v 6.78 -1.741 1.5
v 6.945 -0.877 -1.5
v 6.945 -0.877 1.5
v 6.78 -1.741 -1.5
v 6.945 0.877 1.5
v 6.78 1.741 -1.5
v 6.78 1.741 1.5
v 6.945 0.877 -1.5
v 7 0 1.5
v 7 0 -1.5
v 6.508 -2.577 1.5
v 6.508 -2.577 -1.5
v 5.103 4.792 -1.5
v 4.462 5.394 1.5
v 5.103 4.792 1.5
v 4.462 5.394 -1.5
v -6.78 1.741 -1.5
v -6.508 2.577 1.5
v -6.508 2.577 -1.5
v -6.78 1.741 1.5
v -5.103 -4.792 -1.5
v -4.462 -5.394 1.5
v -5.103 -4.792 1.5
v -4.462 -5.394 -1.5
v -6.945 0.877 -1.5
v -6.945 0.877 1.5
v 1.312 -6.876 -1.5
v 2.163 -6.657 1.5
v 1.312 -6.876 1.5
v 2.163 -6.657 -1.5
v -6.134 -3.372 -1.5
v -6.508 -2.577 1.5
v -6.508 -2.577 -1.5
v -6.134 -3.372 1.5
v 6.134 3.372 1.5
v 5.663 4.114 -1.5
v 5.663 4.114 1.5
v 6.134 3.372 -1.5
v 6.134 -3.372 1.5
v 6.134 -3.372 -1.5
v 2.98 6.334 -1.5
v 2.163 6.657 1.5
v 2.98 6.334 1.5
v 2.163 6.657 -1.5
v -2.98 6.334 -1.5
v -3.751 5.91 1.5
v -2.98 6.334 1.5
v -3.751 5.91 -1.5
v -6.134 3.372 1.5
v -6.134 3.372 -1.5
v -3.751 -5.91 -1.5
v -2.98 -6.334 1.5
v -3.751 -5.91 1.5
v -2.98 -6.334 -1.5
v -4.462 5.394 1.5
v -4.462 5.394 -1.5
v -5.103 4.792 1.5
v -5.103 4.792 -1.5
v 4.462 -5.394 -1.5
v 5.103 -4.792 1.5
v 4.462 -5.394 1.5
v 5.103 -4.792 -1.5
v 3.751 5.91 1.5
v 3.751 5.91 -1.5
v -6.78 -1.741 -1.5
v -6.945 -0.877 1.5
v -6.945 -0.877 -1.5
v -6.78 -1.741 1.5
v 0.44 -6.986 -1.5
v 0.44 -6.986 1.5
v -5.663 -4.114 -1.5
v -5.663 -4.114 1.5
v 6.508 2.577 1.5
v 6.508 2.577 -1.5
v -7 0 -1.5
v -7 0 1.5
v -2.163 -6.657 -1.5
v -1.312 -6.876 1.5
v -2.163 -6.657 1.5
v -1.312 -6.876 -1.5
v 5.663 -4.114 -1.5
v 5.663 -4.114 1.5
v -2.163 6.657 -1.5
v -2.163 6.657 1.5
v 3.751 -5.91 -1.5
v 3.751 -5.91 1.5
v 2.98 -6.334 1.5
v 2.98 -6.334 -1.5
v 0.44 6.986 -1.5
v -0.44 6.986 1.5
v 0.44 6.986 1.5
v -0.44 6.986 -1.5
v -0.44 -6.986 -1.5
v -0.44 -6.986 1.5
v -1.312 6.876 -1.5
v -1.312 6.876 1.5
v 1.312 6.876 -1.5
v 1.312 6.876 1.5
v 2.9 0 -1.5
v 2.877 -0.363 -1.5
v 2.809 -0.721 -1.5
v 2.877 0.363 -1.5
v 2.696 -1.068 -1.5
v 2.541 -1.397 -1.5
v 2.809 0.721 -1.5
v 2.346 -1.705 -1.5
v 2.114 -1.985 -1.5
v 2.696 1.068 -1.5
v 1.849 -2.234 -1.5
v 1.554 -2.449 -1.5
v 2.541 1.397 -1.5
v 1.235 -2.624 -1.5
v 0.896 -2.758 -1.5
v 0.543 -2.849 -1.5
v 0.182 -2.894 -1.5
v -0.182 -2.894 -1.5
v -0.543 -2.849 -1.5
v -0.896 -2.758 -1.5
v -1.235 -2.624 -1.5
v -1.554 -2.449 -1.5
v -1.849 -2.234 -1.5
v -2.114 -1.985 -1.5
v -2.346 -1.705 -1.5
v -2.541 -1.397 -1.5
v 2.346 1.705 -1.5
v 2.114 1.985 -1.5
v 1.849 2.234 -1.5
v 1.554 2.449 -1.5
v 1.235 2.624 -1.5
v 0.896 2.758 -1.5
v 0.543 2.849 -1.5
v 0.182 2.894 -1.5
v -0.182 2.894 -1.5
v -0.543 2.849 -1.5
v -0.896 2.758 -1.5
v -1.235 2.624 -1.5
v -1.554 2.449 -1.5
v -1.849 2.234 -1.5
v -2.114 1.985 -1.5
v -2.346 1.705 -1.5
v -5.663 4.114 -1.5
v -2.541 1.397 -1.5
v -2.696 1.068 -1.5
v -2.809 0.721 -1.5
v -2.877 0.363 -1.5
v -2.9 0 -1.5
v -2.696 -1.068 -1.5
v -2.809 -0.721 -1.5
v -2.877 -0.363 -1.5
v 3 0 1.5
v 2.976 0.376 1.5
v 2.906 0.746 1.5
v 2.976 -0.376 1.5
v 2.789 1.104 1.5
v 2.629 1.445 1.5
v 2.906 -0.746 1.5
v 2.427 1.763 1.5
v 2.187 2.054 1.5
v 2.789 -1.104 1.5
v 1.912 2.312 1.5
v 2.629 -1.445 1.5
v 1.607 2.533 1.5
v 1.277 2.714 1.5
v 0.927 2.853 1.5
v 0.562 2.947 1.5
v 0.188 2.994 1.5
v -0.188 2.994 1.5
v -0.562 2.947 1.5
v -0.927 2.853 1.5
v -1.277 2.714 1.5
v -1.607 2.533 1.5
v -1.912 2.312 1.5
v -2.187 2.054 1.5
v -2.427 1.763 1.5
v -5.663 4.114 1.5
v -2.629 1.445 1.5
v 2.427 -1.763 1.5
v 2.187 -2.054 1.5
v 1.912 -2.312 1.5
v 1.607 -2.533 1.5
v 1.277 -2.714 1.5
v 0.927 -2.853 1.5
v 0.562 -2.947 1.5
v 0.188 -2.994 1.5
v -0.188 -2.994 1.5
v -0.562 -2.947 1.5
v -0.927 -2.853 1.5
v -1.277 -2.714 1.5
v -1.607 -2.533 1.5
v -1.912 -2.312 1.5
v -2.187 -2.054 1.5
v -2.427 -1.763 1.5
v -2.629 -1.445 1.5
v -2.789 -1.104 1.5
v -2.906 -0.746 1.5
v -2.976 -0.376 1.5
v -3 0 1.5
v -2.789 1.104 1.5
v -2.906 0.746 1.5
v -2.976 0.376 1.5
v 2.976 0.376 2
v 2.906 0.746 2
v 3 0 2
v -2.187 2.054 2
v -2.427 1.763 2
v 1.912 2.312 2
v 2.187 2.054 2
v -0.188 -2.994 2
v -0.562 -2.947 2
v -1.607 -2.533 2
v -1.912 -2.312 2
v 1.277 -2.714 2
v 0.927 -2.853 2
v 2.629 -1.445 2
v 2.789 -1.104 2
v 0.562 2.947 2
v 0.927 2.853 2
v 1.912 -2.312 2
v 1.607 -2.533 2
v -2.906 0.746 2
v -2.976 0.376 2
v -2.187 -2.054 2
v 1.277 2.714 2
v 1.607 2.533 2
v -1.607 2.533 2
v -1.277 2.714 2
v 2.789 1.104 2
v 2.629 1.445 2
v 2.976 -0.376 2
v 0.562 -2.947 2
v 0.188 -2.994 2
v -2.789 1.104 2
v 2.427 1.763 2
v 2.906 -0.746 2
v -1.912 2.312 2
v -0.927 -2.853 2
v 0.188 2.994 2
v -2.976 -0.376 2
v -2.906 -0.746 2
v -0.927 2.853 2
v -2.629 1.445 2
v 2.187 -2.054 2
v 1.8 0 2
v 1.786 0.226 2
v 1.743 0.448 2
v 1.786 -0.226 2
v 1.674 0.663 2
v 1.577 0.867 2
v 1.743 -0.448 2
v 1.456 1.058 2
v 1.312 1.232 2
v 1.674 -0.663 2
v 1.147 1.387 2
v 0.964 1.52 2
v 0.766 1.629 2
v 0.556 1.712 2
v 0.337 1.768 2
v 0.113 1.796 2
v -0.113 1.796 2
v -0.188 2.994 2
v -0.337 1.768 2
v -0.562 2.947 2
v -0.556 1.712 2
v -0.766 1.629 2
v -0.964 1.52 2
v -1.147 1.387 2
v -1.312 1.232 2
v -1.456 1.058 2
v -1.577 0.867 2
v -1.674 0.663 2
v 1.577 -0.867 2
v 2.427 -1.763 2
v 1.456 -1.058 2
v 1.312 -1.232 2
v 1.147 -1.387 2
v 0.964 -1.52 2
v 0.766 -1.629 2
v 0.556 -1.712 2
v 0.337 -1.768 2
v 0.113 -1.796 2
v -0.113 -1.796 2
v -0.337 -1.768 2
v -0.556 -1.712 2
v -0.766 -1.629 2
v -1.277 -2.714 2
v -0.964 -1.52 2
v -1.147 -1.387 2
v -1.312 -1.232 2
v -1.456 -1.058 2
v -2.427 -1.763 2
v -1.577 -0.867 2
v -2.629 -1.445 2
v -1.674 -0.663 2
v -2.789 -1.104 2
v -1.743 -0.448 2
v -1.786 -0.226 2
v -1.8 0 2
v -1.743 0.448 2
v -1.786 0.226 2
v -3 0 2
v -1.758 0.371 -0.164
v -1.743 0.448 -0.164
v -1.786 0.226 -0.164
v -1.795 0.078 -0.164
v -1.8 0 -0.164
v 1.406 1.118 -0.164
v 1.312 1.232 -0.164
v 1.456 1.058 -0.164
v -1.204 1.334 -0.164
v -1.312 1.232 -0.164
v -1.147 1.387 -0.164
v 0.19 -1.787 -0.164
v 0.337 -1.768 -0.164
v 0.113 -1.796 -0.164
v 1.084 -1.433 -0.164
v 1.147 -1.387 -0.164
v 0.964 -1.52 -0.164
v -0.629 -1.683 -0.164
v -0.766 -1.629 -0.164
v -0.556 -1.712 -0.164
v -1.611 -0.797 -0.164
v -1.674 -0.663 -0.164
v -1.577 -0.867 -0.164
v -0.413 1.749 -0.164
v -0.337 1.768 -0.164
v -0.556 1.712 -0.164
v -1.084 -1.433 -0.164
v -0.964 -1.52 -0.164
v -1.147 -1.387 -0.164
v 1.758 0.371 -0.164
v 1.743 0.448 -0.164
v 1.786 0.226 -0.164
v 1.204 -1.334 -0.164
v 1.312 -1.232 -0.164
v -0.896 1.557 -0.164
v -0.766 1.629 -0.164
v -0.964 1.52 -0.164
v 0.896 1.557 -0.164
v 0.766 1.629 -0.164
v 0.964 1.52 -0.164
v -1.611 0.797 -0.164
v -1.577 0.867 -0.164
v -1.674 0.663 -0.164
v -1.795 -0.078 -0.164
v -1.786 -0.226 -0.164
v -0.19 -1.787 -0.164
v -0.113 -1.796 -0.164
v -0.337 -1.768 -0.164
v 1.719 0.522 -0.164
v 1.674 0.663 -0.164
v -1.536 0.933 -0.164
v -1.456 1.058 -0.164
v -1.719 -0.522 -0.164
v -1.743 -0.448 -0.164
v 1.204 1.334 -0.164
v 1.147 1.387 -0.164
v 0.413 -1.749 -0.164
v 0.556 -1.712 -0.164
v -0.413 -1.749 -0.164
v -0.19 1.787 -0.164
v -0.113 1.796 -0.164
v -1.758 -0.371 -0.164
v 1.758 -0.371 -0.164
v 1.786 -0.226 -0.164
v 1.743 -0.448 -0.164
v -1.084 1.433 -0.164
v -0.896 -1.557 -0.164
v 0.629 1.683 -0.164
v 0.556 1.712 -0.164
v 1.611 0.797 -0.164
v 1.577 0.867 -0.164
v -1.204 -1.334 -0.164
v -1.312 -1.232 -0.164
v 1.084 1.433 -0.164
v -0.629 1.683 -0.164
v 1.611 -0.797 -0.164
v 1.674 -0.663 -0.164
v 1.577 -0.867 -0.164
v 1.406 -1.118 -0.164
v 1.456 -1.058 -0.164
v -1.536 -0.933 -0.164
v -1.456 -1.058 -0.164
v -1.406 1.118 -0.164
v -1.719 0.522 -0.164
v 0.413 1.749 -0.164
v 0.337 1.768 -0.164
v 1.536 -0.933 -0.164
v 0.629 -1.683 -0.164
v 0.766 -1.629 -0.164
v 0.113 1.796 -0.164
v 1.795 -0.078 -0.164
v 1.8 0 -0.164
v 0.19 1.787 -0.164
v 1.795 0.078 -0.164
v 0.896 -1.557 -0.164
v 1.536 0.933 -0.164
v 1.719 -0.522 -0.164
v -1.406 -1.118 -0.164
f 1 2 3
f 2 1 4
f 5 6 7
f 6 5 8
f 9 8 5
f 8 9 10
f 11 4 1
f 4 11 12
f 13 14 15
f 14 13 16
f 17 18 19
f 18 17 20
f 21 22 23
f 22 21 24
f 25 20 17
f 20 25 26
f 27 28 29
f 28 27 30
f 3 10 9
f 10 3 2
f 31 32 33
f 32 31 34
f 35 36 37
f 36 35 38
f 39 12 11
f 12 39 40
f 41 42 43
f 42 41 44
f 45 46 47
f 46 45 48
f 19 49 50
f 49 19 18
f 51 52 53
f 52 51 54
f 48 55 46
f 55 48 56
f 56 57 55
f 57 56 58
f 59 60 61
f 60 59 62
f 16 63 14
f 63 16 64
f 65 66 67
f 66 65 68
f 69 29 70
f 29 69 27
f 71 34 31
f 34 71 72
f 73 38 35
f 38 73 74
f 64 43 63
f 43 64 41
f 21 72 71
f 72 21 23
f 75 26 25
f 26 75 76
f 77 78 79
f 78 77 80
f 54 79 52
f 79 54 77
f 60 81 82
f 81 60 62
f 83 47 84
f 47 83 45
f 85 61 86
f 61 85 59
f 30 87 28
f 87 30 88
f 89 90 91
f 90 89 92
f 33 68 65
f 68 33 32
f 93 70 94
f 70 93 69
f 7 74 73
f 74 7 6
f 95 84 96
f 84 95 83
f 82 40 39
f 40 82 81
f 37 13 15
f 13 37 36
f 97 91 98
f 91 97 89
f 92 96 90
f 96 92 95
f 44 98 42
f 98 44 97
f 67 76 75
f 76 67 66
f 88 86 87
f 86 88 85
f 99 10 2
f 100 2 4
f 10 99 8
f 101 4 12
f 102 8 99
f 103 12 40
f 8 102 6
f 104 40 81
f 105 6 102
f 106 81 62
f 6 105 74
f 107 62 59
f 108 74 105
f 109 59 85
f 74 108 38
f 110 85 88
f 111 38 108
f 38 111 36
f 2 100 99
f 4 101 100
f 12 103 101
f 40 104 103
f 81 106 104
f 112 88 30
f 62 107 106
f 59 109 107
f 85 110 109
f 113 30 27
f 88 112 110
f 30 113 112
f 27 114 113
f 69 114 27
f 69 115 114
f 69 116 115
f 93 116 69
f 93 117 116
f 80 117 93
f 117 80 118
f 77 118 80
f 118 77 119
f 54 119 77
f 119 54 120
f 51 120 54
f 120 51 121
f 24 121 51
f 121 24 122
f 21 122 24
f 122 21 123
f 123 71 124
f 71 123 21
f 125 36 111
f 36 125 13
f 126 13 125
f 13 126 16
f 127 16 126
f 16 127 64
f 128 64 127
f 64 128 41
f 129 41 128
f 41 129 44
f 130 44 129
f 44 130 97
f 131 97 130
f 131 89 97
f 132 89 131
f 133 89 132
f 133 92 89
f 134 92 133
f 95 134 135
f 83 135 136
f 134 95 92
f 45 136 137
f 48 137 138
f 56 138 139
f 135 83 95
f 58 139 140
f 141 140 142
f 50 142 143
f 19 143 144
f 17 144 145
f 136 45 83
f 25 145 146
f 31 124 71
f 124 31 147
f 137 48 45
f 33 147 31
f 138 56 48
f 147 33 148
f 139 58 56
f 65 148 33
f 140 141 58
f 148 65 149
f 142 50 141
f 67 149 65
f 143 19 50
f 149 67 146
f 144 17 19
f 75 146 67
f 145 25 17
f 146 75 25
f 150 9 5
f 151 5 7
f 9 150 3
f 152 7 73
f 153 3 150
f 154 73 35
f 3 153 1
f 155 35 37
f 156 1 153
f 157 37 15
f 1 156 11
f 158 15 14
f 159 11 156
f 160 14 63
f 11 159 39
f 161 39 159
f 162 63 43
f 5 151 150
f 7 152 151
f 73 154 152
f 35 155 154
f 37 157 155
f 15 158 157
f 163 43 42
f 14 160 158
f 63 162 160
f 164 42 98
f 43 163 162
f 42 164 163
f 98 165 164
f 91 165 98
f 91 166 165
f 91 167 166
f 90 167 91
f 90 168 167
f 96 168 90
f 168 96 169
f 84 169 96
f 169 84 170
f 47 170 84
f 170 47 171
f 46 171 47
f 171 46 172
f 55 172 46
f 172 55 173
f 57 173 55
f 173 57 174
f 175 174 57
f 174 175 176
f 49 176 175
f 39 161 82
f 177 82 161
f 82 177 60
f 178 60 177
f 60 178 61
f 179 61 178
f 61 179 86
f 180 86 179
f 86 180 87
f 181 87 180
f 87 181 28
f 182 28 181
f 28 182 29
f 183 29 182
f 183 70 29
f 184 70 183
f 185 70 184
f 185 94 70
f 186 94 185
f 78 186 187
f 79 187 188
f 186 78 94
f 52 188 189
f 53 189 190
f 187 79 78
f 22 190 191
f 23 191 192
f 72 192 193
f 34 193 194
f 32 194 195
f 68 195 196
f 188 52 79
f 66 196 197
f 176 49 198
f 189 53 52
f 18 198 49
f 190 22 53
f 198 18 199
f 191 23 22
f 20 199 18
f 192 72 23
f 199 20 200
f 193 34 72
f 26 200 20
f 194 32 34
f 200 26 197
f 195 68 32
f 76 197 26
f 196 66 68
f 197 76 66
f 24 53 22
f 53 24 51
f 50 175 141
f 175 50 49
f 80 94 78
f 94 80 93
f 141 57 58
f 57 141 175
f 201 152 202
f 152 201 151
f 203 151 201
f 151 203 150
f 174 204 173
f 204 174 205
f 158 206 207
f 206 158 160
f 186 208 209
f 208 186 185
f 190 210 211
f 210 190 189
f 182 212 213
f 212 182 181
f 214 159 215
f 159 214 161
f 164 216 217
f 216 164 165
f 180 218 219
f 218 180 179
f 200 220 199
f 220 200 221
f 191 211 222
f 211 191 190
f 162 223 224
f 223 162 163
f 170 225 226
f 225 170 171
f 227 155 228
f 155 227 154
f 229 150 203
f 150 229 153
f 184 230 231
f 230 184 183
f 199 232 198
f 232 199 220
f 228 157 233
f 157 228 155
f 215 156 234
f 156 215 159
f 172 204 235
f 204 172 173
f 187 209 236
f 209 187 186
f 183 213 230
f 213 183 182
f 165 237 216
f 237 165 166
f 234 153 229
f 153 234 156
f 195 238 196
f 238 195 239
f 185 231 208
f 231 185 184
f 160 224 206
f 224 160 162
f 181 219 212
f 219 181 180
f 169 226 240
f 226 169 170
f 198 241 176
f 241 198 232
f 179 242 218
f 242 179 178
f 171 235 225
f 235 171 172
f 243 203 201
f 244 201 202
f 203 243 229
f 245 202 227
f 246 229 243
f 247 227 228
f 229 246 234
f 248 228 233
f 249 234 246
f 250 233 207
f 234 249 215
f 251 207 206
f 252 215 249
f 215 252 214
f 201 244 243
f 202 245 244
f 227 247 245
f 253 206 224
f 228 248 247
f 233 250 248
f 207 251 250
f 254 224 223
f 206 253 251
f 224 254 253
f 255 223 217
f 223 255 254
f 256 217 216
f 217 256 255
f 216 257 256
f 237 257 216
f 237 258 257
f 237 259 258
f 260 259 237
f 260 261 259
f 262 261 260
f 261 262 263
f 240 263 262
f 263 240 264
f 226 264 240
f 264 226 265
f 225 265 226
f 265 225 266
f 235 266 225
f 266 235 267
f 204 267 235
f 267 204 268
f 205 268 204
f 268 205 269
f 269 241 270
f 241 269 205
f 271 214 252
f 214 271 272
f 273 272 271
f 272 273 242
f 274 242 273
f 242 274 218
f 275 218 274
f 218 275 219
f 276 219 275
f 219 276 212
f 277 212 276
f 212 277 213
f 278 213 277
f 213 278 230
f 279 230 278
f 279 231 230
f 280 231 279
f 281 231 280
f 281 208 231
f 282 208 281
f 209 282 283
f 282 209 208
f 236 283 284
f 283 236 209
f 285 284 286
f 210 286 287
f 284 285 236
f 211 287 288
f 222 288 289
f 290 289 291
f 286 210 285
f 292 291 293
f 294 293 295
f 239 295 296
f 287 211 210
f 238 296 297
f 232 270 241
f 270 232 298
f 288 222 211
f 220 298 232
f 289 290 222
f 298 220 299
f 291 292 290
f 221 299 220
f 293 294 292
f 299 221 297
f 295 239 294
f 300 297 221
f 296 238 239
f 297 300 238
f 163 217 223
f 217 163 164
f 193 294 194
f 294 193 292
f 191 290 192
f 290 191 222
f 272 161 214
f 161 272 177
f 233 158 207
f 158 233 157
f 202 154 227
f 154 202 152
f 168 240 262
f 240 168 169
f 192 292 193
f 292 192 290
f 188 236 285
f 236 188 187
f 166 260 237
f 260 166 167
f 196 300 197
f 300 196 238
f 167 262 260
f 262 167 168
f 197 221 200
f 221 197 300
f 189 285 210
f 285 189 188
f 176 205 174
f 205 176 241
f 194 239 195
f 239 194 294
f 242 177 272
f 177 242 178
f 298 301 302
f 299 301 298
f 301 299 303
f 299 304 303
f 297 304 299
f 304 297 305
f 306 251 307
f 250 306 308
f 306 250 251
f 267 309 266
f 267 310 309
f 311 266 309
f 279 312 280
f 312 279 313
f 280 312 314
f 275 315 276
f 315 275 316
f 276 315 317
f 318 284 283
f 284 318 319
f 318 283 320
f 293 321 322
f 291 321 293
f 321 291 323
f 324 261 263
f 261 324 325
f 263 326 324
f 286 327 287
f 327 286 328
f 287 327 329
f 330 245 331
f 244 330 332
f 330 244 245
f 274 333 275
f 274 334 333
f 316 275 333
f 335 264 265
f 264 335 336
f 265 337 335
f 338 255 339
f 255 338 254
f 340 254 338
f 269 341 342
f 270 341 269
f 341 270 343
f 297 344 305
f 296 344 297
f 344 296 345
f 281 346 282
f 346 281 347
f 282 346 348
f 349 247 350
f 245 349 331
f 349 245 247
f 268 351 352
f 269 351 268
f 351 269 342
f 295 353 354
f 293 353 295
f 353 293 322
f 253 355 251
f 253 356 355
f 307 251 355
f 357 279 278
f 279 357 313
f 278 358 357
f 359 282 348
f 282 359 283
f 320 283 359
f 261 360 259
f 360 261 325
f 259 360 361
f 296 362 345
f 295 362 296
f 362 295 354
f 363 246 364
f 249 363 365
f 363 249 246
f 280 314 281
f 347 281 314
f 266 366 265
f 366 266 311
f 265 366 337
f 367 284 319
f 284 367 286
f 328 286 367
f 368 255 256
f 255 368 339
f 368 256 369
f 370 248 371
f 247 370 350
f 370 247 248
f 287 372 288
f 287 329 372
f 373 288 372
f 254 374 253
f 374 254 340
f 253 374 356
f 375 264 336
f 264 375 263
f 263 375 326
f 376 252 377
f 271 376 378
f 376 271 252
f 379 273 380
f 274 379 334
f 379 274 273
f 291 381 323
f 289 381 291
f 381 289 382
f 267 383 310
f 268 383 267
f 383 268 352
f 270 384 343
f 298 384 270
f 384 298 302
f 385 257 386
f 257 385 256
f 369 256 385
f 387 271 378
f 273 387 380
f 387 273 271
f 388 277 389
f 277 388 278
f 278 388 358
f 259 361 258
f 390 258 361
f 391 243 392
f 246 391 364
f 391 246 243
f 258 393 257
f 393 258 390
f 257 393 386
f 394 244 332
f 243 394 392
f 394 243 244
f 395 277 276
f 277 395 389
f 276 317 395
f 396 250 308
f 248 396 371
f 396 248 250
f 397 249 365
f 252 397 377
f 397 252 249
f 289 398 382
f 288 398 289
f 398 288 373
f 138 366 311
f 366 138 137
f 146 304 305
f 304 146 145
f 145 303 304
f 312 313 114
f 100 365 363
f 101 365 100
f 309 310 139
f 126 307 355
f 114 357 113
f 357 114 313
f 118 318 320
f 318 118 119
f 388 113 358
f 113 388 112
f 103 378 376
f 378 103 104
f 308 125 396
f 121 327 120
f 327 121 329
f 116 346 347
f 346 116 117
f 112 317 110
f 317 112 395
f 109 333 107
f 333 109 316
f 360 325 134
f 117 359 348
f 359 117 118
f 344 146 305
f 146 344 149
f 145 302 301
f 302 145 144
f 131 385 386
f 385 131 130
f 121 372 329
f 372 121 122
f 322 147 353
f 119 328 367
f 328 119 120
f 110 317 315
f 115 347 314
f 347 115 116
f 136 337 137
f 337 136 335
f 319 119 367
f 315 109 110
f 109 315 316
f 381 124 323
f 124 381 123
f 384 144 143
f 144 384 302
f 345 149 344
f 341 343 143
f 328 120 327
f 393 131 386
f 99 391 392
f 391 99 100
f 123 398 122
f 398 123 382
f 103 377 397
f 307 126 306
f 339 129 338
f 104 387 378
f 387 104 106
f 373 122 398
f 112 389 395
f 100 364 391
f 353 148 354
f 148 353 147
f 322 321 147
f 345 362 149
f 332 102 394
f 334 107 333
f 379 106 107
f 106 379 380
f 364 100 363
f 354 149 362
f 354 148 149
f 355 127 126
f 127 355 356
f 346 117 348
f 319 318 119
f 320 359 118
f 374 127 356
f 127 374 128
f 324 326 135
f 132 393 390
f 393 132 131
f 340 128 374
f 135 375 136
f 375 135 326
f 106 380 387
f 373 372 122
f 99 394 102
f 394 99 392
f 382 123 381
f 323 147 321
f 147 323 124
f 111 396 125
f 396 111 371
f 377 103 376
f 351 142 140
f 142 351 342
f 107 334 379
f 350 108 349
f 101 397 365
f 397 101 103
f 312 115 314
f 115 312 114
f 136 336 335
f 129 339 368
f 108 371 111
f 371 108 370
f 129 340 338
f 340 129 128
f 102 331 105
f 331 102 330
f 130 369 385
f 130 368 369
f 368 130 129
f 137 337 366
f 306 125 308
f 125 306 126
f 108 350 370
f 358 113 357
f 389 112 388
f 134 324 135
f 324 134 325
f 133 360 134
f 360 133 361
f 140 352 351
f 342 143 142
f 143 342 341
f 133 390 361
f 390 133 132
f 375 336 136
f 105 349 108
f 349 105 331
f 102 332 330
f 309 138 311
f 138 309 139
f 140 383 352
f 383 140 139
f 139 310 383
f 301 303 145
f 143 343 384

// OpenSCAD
$fn = 50;


difference() {
	union() {
		translate(v = [0, 0, -1.5000000000]) {
			cylinder(h = 3, r = 7.0000000000);
		}
		translate(v = [0, 0, -1.5000000000]) {
			cylinder(h = 3.5000000000, r = 3.0000000000);
		}
	}
	union() {
		translate(v = [0, 0, -1.5000000000]) {
			rotate(a = [0, 180, 0]) {
				difference() {
					union() {
						translate(v = [0, 0, -3.5000000000]) {
							cylinder(h = 3.5000000000, r = 1.5000000000);
						}
						translate(v = [0, 0, -3.5000000000]) {
							cylinder(h = 3.5000000000, r = 1.8000000000);
						}
						translate(v = [0, 0, -1.7000000000]) {
							cylinder(h = 1.7000000000, r1 = 1.5000000000, r2 = 2.9000000000);
						}
						translate(v = [0, 0, -3.5000000000]) {
							cylinder(h = 3.5000000000, r = 1.5000000000);
						}
					}
					union();
				}
			}
		}
		translate(v = [0, 0, -100.0000000000]) {
			cylinder(h = 200, r = 1.5000000000);
		}
	}
}
